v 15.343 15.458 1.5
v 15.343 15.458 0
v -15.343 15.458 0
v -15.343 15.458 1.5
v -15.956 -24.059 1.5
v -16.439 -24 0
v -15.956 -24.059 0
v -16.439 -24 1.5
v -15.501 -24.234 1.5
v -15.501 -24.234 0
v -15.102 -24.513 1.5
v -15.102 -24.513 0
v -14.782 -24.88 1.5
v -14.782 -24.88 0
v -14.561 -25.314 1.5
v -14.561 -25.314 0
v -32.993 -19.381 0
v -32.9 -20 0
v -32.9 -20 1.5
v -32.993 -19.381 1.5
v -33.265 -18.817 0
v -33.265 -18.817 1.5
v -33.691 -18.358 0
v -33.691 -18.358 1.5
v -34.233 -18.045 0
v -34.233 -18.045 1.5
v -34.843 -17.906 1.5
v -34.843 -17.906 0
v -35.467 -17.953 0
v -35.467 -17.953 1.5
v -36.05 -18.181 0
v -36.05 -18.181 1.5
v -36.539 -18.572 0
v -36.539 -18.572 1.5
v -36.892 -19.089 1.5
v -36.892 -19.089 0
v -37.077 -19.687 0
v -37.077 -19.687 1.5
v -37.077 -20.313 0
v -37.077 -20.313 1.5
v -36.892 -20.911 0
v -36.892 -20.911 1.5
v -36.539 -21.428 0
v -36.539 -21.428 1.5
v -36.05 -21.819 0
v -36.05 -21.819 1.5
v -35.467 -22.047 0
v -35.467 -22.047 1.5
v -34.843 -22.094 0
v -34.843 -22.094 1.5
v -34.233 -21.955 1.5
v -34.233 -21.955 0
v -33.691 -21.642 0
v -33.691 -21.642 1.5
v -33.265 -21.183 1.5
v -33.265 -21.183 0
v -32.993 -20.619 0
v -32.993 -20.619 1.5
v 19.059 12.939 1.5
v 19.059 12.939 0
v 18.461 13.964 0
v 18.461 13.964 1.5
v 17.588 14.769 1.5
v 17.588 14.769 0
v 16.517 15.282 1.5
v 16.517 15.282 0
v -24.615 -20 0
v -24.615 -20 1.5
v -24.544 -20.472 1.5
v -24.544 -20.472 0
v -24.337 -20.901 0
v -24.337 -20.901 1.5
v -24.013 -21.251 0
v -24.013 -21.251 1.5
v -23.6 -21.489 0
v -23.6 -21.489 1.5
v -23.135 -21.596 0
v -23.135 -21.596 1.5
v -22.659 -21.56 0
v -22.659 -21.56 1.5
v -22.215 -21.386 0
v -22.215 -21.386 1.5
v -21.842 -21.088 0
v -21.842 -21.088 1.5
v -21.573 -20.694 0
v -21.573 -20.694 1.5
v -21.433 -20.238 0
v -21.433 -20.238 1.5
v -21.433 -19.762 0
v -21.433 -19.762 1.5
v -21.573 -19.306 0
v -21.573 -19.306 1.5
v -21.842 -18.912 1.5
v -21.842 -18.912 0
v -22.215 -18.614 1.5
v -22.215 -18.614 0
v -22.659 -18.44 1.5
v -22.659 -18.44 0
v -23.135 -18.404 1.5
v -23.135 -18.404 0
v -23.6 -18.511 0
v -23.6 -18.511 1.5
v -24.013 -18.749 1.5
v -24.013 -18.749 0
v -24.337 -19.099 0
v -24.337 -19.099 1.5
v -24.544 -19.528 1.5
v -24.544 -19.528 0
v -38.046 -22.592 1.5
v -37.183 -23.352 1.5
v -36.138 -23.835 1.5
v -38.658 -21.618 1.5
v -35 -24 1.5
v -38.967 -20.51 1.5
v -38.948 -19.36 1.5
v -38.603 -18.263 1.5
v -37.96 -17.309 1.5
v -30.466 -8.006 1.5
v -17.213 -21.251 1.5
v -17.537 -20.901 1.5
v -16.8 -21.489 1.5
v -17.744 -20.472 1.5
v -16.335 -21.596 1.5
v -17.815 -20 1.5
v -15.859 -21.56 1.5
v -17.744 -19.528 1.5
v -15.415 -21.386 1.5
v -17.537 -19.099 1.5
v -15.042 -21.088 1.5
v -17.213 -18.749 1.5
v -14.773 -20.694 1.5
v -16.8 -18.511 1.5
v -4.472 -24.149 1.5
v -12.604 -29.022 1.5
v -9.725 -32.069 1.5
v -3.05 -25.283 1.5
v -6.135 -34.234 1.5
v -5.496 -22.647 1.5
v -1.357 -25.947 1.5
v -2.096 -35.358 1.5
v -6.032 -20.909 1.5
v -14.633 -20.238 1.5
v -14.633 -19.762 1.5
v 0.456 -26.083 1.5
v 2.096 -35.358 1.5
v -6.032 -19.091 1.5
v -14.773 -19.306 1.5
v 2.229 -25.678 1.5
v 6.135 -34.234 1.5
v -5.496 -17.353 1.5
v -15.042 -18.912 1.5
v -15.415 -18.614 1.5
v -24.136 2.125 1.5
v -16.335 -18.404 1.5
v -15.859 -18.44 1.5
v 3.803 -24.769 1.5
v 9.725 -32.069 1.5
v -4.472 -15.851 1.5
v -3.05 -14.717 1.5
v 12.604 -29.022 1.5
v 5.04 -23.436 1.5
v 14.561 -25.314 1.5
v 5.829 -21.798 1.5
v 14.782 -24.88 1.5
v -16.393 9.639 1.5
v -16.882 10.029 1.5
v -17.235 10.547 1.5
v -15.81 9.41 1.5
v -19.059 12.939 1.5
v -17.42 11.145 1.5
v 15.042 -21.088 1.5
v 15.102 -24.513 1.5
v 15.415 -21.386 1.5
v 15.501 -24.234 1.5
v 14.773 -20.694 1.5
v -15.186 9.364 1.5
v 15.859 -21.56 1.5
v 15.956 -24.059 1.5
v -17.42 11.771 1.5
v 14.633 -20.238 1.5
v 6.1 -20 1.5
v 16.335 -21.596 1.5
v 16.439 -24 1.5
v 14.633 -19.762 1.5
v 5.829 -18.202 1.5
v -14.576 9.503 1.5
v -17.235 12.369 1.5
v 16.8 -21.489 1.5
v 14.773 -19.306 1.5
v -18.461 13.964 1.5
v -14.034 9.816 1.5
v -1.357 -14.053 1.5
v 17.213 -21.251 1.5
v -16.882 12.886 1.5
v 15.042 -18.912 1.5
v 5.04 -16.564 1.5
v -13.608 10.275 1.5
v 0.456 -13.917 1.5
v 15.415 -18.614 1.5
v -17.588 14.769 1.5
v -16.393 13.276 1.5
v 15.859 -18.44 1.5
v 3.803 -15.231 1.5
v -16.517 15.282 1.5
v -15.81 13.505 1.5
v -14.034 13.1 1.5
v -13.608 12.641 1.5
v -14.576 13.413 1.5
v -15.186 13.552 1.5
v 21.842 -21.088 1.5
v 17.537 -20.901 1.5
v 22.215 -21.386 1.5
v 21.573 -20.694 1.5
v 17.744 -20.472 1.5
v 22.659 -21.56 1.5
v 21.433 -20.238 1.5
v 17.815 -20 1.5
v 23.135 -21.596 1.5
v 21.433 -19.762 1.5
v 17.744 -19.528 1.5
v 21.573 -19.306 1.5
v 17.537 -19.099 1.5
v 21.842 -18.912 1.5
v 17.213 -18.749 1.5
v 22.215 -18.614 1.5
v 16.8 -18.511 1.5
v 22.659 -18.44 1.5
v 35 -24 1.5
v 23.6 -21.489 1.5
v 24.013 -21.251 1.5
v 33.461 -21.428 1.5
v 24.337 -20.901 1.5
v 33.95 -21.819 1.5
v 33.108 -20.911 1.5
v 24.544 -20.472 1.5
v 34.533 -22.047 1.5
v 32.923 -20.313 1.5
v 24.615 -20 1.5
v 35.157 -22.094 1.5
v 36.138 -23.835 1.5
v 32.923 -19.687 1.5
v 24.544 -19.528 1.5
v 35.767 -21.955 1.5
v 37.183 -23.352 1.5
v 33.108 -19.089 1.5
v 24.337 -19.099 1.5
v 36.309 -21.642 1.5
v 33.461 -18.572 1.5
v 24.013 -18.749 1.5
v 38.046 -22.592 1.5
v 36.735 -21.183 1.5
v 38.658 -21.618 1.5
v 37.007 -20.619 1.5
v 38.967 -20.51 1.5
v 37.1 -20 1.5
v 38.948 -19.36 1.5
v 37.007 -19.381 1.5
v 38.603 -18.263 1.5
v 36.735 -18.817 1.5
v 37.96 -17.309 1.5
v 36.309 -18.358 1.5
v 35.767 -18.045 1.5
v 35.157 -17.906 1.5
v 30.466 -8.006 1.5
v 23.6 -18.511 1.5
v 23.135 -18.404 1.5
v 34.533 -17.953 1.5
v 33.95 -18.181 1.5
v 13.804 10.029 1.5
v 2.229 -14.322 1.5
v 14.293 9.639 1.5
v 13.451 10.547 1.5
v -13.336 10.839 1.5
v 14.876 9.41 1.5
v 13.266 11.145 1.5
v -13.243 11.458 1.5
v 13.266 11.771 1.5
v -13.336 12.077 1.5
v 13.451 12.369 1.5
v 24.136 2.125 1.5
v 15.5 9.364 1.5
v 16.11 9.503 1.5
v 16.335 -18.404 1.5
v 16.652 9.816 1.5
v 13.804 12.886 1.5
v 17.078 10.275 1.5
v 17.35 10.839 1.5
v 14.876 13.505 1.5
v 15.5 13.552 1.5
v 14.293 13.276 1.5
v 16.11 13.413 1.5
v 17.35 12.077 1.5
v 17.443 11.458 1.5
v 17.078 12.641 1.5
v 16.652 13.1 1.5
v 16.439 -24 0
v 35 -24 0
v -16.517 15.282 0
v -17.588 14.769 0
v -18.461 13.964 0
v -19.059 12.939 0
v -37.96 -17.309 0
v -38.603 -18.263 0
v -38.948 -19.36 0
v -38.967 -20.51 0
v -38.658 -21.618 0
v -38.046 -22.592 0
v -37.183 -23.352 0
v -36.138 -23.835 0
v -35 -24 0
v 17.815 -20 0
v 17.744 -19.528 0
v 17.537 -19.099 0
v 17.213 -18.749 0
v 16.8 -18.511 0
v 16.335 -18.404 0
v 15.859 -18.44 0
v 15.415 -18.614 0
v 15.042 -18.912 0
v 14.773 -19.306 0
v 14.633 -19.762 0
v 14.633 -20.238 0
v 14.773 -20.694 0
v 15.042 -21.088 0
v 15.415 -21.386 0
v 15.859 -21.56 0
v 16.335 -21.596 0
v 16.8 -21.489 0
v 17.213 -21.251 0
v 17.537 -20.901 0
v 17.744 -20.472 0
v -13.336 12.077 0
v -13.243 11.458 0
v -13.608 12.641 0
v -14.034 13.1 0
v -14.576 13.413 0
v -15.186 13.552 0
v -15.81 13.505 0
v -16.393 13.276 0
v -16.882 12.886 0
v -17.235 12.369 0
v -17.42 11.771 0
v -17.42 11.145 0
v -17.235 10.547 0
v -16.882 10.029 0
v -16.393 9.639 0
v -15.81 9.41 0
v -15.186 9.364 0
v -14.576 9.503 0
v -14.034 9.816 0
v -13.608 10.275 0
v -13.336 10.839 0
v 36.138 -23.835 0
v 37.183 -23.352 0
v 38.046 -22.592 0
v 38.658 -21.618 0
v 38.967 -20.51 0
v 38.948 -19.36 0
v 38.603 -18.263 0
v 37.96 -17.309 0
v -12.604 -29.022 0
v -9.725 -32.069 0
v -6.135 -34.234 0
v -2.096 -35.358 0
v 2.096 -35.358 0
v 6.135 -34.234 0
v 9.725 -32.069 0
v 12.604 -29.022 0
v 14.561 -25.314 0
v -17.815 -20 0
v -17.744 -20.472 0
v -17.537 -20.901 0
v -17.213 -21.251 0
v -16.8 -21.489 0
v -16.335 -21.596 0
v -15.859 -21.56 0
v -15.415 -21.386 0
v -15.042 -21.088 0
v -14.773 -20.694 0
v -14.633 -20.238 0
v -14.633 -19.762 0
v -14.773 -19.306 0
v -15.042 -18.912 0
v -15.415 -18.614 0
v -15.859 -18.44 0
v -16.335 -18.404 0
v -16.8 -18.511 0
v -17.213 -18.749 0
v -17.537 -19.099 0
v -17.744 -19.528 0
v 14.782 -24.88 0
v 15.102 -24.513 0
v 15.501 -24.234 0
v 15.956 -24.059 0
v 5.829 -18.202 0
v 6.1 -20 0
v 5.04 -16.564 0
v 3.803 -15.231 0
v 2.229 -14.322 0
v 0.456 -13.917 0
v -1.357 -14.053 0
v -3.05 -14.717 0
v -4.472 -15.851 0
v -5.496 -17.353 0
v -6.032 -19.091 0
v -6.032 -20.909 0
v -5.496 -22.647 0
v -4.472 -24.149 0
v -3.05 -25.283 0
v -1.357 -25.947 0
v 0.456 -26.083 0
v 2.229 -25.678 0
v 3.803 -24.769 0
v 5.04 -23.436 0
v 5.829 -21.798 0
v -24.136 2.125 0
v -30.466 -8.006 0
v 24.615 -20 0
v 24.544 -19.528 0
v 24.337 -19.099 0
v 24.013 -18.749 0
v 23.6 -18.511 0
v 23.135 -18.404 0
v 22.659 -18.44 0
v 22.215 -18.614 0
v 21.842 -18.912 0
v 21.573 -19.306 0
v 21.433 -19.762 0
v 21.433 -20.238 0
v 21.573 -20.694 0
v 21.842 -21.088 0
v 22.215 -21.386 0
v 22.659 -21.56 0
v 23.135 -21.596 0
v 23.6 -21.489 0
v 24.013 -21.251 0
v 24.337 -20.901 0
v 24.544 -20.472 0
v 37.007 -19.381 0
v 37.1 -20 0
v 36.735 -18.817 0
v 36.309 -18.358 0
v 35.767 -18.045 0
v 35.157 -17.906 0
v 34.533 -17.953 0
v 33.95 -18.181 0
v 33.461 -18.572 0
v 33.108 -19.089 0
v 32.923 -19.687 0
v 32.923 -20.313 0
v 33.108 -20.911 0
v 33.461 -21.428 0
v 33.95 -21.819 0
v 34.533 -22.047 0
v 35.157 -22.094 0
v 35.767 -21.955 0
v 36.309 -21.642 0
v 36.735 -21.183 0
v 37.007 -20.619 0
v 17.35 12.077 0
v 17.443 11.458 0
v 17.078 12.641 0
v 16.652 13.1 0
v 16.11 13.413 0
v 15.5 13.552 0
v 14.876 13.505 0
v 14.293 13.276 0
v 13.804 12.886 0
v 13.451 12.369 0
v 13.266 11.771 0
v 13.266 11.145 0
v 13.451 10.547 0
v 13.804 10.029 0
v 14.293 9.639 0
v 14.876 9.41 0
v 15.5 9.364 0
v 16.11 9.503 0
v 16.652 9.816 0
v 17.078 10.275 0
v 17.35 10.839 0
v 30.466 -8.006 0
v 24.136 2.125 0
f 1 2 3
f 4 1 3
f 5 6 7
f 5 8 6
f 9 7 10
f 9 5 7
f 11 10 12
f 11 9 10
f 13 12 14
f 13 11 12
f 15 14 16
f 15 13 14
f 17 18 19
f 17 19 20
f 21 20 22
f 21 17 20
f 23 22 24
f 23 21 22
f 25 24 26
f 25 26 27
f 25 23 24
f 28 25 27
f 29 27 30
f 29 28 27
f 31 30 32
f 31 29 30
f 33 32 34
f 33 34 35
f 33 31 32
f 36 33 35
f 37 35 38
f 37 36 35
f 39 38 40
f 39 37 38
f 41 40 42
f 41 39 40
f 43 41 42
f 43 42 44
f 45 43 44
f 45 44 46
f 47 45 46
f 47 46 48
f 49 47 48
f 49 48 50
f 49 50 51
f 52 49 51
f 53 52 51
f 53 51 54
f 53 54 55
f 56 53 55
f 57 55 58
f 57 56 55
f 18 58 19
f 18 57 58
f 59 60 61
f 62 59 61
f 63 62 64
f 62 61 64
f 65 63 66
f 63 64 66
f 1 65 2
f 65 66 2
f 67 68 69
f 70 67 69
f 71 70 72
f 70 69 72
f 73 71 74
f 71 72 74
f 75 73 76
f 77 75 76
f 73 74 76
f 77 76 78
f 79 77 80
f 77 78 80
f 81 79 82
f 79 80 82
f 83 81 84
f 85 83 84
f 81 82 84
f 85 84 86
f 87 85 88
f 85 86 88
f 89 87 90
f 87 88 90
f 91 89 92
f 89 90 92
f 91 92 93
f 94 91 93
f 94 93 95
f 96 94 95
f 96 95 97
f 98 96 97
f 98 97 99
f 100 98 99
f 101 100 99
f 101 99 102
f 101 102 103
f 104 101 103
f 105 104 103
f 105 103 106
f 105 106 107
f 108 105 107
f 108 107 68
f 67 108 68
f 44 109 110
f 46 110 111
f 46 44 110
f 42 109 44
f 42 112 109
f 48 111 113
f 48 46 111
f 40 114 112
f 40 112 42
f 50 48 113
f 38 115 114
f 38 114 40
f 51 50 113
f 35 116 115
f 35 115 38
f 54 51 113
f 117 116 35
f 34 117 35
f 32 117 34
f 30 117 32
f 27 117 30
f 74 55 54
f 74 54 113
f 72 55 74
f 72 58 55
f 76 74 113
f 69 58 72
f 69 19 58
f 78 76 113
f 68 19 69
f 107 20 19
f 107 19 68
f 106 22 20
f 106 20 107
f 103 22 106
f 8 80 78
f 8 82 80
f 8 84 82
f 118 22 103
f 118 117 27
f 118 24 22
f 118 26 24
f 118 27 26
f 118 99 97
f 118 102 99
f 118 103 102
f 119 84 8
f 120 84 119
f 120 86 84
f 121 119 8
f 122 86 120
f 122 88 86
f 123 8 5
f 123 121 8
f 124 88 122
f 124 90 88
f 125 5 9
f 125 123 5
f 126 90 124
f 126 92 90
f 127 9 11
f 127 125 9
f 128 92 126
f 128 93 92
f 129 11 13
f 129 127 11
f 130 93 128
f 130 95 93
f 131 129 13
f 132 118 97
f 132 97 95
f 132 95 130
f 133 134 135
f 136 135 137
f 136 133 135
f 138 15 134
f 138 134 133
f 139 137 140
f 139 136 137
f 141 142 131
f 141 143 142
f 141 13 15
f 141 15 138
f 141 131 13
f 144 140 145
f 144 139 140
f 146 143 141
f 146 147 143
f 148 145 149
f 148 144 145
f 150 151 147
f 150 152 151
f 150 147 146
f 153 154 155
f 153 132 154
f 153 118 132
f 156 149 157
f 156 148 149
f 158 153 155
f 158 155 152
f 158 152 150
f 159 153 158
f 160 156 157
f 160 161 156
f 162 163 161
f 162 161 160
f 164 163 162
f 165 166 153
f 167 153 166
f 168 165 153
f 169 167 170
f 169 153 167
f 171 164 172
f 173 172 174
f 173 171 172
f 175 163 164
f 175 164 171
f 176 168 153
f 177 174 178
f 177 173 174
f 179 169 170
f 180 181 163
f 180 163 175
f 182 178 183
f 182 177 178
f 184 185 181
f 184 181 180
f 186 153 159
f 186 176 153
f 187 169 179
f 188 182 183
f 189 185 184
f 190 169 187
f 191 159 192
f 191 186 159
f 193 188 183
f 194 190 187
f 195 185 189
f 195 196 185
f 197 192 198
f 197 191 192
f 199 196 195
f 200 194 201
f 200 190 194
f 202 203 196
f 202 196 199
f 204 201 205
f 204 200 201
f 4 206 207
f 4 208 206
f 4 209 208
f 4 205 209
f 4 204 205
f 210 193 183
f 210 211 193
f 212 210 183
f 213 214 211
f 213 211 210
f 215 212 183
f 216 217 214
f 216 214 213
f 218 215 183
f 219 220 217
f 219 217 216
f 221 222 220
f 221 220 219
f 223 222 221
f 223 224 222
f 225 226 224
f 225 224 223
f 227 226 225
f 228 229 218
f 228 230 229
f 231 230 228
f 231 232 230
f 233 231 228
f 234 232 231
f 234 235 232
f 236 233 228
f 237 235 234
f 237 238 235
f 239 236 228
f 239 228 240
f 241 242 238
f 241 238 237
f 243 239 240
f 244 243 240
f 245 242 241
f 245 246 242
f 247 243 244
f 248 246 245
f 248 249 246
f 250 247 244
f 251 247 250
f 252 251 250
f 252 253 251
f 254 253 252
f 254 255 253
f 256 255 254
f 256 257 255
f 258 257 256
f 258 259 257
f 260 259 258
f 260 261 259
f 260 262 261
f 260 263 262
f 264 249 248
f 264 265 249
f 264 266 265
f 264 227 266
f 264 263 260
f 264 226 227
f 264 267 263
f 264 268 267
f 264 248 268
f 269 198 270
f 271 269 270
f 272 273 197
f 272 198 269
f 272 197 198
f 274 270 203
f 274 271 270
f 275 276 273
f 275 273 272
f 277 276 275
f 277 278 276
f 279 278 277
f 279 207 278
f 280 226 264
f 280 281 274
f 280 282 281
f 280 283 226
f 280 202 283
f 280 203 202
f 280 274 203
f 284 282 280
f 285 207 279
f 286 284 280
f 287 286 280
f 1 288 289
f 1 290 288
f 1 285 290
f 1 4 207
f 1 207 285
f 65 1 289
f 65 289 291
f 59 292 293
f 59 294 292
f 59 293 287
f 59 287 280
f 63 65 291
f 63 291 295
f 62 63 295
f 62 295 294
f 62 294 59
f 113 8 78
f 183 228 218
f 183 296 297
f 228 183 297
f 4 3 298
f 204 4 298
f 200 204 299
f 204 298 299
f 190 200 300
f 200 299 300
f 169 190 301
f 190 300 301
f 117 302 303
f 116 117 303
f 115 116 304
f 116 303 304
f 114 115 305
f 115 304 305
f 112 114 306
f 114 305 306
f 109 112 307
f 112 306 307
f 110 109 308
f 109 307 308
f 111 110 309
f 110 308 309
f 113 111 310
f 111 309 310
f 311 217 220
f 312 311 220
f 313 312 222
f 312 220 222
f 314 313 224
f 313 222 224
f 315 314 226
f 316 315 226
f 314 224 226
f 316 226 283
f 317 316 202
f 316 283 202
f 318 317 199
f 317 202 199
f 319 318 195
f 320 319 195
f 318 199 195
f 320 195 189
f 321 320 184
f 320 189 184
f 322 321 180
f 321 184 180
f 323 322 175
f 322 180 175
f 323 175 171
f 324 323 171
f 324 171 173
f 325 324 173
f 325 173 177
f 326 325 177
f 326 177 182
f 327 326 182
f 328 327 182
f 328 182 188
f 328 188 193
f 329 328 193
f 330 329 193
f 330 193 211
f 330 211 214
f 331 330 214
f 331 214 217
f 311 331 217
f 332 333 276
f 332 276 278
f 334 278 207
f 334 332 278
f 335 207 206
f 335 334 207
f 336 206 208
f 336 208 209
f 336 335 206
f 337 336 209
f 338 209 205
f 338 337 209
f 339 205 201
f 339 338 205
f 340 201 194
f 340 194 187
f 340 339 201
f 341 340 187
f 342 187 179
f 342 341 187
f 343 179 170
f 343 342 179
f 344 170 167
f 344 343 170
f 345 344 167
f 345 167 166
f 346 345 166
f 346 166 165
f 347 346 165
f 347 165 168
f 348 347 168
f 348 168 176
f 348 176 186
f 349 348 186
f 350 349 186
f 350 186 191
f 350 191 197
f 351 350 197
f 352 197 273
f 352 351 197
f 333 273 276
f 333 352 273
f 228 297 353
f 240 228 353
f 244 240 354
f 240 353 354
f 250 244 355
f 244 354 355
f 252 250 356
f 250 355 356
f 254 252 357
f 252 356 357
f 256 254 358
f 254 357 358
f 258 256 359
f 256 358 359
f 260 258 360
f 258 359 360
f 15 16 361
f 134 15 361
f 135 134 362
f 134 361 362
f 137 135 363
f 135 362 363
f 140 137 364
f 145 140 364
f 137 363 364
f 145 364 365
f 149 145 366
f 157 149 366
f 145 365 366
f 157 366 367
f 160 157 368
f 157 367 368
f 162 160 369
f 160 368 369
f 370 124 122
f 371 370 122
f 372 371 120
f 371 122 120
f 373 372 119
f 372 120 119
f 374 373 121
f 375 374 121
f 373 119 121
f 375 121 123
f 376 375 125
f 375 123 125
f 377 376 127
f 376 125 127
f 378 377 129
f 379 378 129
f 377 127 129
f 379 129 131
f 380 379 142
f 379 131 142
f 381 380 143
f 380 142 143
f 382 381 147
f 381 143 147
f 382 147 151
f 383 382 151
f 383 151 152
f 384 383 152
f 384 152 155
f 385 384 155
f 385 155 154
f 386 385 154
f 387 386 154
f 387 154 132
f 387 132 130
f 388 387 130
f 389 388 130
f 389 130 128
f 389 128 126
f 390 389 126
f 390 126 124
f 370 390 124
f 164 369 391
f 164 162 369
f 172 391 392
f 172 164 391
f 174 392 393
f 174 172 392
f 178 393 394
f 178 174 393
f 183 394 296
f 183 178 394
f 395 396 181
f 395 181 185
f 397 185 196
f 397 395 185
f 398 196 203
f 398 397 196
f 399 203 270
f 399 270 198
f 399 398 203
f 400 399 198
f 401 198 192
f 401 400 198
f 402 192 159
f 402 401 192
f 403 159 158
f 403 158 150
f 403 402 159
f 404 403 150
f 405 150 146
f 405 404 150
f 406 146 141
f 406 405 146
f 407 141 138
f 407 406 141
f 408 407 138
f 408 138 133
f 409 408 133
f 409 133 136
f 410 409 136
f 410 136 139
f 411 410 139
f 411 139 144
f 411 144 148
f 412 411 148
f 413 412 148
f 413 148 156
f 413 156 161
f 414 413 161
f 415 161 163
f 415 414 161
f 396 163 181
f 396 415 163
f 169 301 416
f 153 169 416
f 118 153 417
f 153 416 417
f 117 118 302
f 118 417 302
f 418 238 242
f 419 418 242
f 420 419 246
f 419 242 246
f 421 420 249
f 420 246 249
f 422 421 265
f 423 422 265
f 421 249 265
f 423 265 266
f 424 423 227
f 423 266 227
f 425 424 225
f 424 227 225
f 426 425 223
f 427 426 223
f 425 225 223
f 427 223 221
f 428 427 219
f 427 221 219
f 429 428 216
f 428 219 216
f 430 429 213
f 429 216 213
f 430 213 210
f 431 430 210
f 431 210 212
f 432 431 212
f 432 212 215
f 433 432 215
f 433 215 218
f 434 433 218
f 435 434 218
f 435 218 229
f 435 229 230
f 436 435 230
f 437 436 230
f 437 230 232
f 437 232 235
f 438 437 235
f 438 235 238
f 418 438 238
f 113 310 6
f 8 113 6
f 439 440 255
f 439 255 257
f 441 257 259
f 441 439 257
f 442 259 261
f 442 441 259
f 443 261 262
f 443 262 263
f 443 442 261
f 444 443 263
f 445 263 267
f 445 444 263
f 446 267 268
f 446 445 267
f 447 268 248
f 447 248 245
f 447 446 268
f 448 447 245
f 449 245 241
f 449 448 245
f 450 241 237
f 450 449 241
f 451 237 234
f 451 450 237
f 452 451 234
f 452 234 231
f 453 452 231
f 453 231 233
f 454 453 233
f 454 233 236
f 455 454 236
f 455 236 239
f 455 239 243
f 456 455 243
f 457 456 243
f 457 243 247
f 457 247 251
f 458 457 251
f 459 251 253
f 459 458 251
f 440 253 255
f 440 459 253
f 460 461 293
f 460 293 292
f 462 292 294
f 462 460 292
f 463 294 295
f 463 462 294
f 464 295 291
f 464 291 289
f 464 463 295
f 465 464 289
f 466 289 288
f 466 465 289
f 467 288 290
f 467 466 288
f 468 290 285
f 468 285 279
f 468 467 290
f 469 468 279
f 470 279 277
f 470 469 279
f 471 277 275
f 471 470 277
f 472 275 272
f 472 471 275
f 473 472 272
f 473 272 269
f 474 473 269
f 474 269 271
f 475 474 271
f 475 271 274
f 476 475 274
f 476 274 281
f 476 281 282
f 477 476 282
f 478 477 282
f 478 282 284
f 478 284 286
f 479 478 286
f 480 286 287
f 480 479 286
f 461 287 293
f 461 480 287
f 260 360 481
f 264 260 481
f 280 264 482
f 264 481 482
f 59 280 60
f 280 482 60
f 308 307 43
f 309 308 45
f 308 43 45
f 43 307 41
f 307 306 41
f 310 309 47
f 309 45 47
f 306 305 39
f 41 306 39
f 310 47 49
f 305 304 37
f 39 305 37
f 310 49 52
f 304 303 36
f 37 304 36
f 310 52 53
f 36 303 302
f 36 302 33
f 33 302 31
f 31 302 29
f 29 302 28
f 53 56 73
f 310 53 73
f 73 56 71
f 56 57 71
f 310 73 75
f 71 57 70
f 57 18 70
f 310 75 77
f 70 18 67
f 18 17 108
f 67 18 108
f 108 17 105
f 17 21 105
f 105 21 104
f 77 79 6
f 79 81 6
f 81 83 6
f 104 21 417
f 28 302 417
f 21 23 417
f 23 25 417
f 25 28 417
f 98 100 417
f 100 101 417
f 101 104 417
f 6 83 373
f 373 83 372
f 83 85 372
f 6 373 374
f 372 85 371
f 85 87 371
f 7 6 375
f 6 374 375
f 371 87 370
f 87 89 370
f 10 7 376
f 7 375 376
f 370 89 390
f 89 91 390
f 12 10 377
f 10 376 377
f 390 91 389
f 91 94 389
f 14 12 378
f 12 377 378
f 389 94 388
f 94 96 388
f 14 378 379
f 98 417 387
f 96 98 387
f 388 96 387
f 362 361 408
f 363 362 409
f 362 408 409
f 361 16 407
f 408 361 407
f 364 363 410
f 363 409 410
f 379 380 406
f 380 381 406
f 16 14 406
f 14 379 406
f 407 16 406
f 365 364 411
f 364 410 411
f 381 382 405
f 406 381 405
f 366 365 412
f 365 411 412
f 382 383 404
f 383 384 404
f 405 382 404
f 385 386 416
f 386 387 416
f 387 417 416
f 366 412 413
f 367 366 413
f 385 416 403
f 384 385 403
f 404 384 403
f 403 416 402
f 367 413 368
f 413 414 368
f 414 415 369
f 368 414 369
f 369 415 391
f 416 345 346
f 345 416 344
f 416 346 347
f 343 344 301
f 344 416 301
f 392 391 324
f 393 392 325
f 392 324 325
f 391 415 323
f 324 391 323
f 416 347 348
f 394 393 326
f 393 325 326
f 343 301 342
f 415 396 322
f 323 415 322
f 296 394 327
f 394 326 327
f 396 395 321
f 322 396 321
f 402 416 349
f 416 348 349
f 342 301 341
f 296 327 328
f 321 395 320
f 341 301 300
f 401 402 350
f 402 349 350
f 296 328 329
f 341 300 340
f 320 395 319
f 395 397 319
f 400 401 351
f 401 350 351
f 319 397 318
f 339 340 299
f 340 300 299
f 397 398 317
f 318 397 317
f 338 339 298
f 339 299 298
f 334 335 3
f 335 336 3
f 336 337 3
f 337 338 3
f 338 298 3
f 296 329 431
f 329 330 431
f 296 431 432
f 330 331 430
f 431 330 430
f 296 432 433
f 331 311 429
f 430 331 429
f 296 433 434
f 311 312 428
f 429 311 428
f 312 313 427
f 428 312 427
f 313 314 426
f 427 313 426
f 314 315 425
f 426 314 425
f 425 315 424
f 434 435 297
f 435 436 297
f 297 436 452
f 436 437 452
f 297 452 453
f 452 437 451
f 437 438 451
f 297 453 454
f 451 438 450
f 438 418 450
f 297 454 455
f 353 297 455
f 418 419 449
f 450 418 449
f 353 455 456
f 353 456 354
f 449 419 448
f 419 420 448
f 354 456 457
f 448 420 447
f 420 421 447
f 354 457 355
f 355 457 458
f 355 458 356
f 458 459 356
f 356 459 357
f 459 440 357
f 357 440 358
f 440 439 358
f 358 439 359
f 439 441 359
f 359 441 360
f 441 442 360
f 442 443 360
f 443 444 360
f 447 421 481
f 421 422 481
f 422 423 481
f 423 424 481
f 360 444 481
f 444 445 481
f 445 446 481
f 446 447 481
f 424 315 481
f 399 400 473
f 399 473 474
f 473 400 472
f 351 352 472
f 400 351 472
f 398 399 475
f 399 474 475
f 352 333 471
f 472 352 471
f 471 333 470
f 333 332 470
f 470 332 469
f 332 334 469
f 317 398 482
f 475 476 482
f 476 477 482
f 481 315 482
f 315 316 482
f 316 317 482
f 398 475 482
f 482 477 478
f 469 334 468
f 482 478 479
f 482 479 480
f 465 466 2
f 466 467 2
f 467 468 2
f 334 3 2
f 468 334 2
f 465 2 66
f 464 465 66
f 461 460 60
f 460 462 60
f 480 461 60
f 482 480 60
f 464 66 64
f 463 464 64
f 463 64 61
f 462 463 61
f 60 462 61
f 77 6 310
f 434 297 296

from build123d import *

# Parameters (mm, degrees)
SKETCH_1_R          = 2.1
SKETCH_1_R_2        = 6.1
EXTRUDE_1_DEPTH     = 1.5
SKETCH_2_R          = 6.1
SKETCH_2_R_2        = 1.6
CUT_EXTRUDE_1_DEPTH = 53.758885508
FILLET_1_R          = 2


with BuildPart() as part:
    # ｽｹｯﾁ1 → ﾎﾞｽ - 押し出し1 (new body)
    with BuildSketch(Plane.XY):
        with BuildLine():
            ThreePointArc((-37.95979357, -17.309345429), (-38.658047176, -21.61823696), (-35, -24))
            Line((-35, -24), (-14.974979132, -24))
            ThreePointArc((-14.974979132, -24), (0, -35.5), (14.974979132, -24))
            Line((14.974979132, -24), (35, -24))
            ThreePointArc((35, -24), (38.658047176, -21.61823696), (37.95979357, -17.309345429))
            ThreePointArc((37.95979357, -17.309345429), (27.149823207, -3.034907568), (19.058822549, 12.938531129))
            ThreePointArc((19.058822549, 12.938531129), (17.587655142, 14.768604061), (15.342990138, 15.45779162))
            Line((15.342990138, 15.45779162), (-15.342990138, 15.45779162))
            ThreePointArc((-15.342990138, 15.45779162), (-17.587655142, 14.768604061), (-19.058822549, 12.938531129))
            ThreePointArc((-19.058822549, 12.938531129), (-27.149823207, -3.034907568), (-37.95979357, -17.309345429))
        make_face()
        with Locations((-35, -20)):
            Circle(SKETCH_1_R, mode=Mode.SUBTRACT)
        with Locations((0, -20)):
            Circle(SKETCH_1_R_2, mode=Mode.SUBTRACT)
        with Locations((35, -20)):
            Circle(SKETCH_1_R, mode=Mode.SUBTRACT)
        with Locations((-15.342990138, 11.45779162)):
            Circle(SKETCH_1_R, mode=Mode.SUBTRACT)
        with Locations((15.342990138, 11.45779162)):
            Circle(SKETCH_1_R, mode=Mode.SUBTRACT)
    extrude(amount=EXTRUDE_1_DEPTH)

    # ｽｹｯﾁ2 → ｶｯﾄ - 押し出し1 (cut, through all)
    with BuildSketch(Plane.XY.offset(1.5)):
        with Locations((0, -20)):
            Circle(SKETCH_2_R)
        with Locations((23.015, -20)):
            Circle(SKETCH_2_R_2)
        with Locations(Location((-23.015, -20, 0), (0, 0, 180))):
            Circle(SKETCH_2_R_2)
        with Locations((16.215, -20)):
            Circle(SKETCH_2_R_2)
        with Locations(Location((-16.215, -20, 0), (0, 0, 180))):
            Circle(SKETCH_2_R_2)
    extrude(amount=-CUT_EXTRUDE_1_DEPTH, mode=Mode.SUBTRACT)

    # ﾌｨﾚｯﾄ1
    fillet_1_edges = [part.edges().sort_by_distance(p)[0] for p in [
        (-14.974979132, -24, 0.75),
        (14.974979132, -24, 0.75),
    ]]
    fillet(fillet_1_edges, radius=FILLET_1_R)


solid = part.part
